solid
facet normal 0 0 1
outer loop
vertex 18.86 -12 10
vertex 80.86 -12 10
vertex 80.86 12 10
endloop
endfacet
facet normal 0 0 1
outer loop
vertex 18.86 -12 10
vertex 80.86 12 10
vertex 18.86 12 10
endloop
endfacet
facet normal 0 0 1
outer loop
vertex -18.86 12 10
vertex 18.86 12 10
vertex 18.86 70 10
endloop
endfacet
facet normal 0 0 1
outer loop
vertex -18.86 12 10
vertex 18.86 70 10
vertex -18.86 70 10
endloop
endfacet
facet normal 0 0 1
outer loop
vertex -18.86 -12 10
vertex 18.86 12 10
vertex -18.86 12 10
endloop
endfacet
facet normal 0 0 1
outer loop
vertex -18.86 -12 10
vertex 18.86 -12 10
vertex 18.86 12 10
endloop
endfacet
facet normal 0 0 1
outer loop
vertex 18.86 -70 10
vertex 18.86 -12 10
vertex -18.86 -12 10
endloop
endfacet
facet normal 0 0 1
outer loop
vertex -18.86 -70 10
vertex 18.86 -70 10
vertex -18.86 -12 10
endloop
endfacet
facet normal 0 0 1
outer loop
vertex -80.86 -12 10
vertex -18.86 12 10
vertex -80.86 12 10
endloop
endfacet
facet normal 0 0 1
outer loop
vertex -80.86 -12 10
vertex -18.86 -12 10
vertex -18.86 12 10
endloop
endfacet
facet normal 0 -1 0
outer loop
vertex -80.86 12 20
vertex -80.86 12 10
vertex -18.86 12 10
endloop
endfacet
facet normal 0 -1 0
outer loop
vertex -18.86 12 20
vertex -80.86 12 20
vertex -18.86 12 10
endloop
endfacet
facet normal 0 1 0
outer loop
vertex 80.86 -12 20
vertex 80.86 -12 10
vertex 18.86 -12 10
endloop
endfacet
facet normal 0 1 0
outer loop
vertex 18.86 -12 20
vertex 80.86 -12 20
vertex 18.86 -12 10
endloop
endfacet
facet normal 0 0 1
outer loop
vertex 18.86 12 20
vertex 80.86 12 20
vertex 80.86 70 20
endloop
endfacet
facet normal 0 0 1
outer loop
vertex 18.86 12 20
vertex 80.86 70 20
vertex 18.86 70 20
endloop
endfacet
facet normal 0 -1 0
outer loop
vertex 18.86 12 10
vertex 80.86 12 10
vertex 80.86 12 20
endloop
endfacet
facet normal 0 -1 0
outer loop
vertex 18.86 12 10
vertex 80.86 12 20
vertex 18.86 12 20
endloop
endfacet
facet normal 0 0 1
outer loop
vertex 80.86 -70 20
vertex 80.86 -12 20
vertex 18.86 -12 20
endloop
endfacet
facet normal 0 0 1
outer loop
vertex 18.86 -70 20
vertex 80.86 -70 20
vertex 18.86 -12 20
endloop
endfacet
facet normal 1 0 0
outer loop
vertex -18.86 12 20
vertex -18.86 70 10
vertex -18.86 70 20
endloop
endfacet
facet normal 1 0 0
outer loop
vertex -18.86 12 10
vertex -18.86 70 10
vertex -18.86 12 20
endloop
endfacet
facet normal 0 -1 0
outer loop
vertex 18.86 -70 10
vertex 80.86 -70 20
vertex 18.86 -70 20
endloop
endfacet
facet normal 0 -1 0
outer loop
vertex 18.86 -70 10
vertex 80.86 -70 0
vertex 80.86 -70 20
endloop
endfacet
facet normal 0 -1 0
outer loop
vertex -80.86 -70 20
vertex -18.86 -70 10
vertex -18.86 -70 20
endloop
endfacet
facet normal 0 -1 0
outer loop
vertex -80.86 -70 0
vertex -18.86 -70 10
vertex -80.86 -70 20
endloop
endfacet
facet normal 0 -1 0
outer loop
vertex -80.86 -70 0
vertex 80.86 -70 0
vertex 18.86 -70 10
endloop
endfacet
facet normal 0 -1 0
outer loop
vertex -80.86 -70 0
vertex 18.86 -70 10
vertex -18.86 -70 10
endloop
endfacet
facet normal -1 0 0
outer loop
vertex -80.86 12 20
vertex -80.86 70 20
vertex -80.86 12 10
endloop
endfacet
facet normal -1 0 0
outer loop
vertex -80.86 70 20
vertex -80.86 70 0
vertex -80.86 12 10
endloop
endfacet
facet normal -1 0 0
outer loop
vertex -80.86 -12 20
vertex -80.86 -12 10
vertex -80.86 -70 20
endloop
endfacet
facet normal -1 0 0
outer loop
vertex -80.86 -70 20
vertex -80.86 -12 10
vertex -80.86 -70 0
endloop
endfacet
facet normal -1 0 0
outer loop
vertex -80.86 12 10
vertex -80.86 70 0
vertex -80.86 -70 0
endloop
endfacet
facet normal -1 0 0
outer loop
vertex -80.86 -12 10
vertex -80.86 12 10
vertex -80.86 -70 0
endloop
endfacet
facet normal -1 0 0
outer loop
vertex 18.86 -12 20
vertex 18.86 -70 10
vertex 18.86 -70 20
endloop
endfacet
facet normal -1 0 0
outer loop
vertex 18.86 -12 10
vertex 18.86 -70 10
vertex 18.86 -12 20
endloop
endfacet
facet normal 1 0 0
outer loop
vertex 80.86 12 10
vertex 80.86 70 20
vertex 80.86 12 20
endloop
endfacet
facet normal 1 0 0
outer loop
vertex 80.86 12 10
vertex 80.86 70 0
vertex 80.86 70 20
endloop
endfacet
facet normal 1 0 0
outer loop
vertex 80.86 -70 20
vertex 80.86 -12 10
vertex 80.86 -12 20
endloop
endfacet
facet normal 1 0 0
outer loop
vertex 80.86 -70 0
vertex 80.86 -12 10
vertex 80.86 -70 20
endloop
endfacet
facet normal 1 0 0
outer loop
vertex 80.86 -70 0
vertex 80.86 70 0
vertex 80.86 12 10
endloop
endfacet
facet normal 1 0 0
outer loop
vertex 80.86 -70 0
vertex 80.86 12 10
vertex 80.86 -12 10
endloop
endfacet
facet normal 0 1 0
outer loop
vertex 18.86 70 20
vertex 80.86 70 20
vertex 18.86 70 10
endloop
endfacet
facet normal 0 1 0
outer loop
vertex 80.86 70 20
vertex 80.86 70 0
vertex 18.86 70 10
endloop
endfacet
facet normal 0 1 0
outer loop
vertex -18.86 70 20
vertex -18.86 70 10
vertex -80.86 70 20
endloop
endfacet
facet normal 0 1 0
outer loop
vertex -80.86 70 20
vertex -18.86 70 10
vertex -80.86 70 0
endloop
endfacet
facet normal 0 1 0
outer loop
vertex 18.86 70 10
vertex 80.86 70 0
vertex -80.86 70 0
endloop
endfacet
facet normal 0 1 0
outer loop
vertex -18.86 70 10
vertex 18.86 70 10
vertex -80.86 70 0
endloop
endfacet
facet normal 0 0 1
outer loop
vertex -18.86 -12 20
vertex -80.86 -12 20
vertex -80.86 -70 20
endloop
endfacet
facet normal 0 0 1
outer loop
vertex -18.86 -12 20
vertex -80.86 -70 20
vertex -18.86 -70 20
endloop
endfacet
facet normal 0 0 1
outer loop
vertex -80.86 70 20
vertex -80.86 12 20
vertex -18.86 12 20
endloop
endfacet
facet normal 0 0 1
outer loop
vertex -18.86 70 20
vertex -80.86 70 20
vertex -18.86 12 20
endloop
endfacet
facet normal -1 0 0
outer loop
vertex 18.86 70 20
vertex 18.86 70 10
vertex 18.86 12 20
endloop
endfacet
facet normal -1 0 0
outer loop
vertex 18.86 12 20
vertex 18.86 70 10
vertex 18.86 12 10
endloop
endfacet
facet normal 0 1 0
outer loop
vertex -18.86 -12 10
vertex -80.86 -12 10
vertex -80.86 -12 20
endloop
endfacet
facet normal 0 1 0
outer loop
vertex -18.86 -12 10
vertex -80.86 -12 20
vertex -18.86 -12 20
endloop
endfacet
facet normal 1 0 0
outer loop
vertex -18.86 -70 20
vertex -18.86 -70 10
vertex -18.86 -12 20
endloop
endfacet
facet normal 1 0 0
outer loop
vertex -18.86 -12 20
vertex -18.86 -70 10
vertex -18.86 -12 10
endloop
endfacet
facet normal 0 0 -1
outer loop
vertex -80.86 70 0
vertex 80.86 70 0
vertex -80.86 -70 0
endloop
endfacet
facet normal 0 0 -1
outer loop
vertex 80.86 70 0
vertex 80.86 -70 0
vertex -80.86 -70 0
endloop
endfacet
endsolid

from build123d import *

# Parameters (mm, degrees)
SKETCH1_W           = 80.86
SKETCH1_H           = 70
BOSS_EXTRUDE1_DEPTH = 10
SKETCH2_W           = 62
SKETCH2_H           = 58
BOSS_EXTRUDE2_DEPTH = 10


with BuildPart() as part:
    # Sketch1 → Boss-Extrude1 (new body)
    with BuildSketch(Plane.XY):
        with Locations((-40.43, -35)):
            Rectangle(SKETCH1_W, SKETCH1_H)
    extrude(amount=BOSS_EXTRUDE1_DEPTH)

    # Sketch2 → Boss-Extrude2 (add)
    with BuildSketch(Plane.XY.offset(10)):
        with Locations((-49.86, -41)):
            Rectangle(SKETCH2_W, SKETCH2_H)
    extrude(amount=BOSS_EXTRUDE2_DEPTH)

    # Mirror1: part across plane


with BuildPart() as part_1:
    add(part.part)
    add(part.part.mirror(Plane(origin=(0, 0, 10), x_dir=(0, 0, 1), z_dir=(-1, 0, 0))))

    # Mirror2: part across plane


with BuildPart() as part_2:
    add(part_1.part)
    add(part_1.part.mirror(Plane(origin=(-80.86, 0, 10), x_dir=(0, 0, 1), z_dir=(0, -1, 0))))


solid = part_2.part
